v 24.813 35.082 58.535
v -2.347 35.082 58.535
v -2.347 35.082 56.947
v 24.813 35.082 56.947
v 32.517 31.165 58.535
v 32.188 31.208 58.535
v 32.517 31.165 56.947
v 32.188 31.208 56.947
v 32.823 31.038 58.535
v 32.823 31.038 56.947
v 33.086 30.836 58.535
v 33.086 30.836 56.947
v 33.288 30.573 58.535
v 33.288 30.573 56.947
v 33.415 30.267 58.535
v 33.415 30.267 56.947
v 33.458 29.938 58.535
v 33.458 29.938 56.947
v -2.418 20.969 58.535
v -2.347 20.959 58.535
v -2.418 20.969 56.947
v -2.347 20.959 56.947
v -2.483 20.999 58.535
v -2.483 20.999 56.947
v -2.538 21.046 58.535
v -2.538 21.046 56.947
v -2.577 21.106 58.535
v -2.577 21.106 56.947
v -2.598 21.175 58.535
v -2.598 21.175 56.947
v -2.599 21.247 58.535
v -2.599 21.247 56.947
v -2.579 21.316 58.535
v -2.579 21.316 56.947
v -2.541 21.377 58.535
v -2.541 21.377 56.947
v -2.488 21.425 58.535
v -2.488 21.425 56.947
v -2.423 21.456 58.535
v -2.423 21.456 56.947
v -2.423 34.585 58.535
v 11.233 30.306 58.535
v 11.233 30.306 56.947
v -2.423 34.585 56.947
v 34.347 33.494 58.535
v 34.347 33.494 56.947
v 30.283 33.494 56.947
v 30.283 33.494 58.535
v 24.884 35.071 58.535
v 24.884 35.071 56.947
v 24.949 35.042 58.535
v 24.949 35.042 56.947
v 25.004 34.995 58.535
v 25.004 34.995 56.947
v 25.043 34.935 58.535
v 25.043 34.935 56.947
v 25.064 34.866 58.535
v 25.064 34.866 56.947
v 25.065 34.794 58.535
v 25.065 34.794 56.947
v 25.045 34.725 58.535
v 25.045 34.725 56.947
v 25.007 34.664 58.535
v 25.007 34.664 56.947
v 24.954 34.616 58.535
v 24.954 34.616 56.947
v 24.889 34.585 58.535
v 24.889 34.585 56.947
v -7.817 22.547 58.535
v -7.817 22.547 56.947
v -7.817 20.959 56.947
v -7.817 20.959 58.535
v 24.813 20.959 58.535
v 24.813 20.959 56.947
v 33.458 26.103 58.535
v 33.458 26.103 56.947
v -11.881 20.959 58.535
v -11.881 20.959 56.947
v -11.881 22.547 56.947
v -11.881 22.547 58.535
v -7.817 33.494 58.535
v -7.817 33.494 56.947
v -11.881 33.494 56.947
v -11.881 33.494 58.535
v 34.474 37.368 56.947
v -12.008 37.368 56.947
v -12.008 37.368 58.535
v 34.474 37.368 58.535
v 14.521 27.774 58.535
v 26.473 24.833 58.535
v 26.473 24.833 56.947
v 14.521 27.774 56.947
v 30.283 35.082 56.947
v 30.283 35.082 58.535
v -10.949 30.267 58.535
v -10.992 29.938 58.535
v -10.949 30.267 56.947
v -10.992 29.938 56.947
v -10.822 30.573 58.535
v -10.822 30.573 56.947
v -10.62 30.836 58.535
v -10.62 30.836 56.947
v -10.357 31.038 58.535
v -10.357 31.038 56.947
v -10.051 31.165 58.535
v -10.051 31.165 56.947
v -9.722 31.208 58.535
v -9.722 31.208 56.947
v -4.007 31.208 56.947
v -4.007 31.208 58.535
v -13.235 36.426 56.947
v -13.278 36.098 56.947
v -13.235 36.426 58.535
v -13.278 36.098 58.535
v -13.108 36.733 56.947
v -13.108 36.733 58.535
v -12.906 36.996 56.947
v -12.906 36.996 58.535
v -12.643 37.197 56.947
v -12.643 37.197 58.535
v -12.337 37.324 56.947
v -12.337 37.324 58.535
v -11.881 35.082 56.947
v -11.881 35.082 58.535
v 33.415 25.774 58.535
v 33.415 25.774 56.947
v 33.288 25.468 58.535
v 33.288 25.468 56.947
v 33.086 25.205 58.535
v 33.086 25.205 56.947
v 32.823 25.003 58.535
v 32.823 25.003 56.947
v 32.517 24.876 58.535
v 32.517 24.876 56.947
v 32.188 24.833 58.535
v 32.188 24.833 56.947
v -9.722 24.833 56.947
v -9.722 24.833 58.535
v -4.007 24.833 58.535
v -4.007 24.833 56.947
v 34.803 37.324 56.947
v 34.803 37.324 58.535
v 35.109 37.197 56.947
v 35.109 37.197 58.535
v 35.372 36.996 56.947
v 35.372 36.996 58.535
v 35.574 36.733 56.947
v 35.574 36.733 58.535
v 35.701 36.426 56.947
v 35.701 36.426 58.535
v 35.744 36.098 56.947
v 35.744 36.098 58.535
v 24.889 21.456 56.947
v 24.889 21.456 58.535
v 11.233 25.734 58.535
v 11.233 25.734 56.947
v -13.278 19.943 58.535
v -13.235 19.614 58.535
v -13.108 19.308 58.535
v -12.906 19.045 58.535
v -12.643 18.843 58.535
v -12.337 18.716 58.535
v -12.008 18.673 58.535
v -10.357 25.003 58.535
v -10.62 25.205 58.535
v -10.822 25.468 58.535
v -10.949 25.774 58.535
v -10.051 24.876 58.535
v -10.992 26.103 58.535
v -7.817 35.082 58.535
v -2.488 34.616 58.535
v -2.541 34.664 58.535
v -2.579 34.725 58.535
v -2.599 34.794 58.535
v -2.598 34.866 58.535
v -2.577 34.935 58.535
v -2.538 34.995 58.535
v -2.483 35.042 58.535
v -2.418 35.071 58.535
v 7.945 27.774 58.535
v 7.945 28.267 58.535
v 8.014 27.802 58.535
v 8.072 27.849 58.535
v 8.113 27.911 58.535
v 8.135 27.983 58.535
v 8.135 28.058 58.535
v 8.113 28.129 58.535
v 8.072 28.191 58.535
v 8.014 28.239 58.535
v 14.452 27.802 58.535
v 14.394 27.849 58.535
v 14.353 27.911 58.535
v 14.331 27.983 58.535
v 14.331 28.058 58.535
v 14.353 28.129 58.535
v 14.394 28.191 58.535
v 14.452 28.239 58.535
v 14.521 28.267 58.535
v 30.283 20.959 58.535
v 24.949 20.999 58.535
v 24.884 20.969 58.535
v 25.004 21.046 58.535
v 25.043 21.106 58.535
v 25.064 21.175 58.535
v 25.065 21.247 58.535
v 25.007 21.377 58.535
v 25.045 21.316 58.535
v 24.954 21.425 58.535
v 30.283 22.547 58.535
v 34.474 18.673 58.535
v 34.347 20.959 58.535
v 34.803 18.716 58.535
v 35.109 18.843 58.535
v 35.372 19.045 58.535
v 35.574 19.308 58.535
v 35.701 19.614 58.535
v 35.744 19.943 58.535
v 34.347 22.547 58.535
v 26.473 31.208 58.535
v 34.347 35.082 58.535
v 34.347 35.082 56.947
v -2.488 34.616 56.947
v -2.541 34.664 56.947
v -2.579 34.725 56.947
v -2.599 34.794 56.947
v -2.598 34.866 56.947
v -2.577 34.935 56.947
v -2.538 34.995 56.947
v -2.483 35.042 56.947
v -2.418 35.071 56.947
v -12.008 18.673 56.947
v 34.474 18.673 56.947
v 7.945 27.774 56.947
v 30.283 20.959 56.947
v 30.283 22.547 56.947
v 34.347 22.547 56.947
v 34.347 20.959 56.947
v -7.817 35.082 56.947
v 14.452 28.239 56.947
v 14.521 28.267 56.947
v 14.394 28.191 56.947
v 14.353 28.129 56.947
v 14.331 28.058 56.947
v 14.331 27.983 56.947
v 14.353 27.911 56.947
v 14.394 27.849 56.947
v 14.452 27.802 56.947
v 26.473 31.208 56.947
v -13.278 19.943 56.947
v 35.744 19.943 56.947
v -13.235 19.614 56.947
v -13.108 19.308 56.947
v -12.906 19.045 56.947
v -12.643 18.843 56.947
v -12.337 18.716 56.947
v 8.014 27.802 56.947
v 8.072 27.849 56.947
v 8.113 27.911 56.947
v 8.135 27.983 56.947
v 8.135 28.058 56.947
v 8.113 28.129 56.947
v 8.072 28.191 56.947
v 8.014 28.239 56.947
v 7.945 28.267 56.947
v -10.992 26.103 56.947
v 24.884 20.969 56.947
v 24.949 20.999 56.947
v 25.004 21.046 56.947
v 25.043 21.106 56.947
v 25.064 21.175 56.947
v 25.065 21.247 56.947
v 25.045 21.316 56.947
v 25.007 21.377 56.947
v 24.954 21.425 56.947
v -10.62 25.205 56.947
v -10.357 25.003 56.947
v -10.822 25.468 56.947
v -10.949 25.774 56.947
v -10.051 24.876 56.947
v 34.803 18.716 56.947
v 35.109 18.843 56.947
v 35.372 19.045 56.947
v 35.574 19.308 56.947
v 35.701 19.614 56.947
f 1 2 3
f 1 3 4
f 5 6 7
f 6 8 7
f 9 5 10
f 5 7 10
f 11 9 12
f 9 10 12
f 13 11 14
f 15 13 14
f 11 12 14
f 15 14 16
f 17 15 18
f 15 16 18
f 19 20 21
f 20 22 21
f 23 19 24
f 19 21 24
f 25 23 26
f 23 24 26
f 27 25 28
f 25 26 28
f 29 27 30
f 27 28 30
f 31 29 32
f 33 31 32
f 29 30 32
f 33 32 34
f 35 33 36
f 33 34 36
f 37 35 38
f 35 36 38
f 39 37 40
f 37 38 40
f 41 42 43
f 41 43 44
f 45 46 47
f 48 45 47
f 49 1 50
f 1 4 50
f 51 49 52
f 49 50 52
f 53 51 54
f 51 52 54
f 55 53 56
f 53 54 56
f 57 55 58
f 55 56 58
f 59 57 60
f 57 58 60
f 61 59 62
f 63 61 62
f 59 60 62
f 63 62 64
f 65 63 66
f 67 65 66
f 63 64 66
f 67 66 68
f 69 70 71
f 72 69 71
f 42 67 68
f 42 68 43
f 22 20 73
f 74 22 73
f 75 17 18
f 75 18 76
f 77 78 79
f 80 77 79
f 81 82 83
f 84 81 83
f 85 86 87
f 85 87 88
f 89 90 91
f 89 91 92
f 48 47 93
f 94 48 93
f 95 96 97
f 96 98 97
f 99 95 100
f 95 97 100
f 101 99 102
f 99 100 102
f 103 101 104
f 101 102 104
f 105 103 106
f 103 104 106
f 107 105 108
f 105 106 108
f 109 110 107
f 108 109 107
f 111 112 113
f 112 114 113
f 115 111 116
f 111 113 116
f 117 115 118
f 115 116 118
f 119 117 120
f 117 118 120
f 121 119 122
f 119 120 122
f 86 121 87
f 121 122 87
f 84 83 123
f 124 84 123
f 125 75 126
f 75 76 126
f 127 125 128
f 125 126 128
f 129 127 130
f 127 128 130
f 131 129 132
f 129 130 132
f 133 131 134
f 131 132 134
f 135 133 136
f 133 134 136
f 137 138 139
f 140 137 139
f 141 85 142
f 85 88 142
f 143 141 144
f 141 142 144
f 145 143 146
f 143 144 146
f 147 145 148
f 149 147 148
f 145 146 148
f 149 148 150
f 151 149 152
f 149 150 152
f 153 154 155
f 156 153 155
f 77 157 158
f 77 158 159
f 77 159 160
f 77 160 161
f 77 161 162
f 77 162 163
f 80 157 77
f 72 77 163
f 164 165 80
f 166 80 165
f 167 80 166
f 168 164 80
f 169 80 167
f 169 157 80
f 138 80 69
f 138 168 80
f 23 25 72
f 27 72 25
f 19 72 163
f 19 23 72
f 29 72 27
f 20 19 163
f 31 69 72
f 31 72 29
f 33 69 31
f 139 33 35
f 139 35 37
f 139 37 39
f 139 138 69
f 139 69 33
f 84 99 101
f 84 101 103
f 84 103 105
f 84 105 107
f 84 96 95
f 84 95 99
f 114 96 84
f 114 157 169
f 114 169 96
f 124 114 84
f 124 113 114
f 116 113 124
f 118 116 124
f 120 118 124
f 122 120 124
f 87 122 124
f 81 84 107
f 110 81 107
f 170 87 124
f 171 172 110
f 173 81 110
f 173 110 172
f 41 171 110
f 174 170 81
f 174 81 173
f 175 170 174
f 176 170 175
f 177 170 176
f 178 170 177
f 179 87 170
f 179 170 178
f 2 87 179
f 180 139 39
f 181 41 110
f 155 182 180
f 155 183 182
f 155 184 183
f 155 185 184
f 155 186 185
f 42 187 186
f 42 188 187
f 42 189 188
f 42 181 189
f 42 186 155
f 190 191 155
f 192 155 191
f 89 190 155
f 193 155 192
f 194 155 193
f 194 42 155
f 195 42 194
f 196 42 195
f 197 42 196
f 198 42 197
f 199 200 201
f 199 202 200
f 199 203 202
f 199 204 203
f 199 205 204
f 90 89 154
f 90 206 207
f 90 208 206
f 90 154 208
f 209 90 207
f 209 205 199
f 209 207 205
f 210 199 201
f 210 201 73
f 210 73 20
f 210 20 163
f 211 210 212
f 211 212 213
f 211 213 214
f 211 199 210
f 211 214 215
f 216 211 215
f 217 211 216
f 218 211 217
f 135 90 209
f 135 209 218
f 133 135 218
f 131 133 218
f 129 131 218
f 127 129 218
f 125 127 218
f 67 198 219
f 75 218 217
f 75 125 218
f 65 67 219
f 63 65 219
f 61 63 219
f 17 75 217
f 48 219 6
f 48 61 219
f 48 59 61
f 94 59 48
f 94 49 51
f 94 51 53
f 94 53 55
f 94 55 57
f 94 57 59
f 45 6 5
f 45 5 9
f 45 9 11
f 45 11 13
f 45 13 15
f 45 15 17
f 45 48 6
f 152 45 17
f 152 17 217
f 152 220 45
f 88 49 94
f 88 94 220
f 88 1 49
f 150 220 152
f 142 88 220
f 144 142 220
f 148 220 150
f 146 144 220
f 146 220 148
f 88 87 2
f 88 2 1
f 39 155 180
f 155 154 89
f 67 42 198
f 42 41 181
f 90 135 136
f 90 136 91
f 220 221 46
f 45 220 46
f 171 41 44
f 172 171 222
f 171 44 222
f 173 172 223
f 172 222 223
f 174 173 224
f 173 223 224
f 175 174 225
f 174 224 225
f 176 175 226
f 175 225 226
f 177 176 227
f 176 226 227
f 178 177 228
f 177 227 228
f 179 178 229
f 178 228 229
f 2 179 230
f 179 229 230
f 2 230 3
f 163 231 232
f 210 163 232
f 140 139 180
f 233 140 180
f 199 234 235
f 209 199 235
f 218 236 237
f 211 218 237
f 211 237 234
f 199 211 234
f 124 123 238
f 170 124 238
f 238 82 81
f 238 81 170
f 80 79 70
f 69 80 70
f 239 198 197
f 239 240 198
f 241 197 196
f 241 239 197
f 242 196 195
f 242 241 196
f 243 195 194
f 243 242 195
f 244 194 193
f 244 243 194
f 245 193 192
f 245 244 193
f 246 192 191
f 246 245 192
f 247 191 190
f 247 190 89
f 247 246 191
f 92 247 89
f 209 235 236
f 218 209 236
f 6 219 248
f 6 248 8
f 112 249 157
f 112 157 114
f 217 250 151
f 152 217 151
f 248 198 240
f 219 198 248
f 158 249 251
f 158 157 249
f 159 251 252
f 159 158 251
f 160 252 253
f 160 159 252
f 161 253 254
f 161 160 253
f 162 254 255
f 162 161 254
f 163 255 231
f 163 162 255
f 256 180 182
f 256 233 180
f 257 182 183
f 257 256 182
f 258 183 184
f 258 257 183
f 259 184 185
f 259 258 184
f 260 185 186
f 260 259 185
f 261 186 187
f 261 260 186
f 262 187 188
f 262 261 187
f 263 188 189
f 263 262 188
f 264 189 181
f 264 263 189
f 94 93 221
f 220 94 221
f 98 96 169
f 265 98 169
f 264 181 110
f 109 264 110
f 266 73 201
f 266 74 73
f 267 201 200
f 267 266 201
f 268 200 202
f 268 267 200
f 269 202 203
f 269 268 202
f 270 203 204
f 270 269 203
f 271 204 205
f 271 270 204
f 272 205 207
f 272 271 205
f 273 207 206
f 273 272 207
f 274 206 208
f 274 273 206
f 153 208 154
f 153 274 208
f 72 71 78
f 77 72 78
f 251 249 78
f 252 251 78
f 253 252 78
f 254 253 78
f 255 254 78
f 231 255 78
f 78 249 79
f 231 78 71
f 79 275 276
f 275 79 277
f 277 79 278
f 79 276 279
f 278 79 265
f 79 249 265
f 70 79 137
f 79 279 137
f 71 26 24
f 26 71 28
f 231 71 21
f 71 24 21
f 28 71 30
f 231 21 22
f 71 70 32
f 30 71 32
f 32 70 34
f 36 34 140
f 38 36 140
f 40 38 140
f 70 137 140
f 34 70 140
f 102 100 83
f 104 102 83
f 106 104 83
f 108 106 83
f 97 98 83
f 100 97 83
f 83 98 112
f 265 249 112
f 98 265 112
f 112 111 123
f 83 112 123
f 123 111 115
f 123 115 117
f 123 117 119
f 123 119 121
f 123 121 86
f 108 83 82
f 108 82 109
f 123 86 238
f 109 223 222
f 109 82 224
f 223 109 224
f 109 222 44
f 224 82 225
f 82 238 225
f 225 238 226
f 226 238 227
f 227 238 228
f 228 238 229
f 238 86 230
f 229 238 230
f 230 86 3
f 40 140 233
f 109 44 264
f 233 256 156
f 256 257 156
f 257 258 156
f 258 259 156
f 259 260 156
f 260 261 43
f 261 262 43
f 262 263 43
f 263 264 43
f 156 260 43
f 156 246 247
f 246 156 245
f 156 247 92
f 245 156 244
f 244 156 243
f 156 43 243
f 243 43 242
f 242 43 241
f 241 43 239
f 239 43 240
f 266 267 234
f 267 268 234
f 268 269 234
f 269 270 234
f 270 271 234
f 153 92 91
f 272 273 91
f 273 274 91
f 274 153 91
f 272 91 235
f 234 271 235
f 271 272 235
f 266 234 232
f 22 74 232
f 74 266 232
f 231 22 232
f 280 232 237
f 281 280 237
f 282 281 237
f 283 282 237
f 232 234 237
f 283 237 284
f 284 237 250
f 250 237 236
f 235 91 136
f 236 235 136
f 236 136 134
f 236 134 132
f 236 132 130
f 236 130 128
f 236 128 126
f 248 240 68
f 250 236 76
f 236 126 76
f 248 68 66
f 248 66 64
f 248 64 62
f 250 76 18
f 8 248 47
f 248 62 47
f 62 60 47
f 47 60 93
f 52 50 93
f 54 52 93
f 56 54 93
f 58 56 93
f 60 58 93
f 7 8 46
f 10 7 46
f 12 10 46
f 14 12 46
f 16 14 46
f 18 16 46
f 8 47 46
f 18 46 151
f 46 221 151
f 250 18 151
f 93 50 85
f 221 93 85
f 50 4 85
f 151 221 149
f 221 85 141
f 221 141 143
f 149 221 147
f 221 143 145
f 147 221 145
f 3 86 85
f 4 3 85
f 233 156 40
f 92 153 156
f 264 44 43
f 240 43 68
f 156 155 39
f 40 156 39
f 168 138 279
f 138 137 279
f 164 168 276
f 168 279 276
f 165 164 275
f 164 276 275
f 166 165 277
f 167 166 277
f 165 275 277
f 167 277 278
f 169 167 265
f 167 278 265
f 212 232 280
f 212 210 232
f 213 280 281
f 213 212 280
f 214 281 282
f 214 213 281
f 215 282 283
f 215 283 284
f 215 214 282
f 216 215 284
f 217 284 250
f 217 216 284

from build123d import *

# Parameters (mm, degrees)
SKETCH1_W           = 49.022
SKETCH1_H           = 18.6944
SKETCH1_W_2         = 38.1
SKETCH1_H_2         = 1.5875
BOSS_EXTRUDE1_DEPTH = 1.5875
CUT_EXTRUDE1_REACH  = 53.735
FILLET1_R           = 0.254
FILLET2_R           = 1.27


with BuildPart() as part:
    # Sketch1 → Boss-Extrude1 (new body)
    # profile 1 of 2: a face of its own
    with BuildSketch(Plane.XY.offset(56.947143149)):
        with Locations((11.232994638, 28.020399012)):
            Rectangle(SKETCH1_W, SKETCH1_H)
        Polygon((-11.881005362, 20.959199012), (-11.881005362, 22.546699012), (-10.992005362, 22.546699012), (-8.706005362, 22.546699012), (-7.817005362, 22.546699012), (-7.817005362, 20.959199012), (-8.706005362, 20.959199012), (-10.992005362, 20.959199012), align=None, mode=Mode.SUBTRACT)
        Polygon((33.457994638, 22.546699012), (34.346994638, 22.546699012), (34.346994638, 20.959199012), (33.457994638, 20.959199012), (31.171994638, 20.959199012), (30.282994638, 20.959199012), (30.282994638, 22.546699012), (31.171994638, 22.546699012), align=None, mode=Mode.SUBTRACT)
        Polygon((31.171994638, 33.494099012), (30.282994638, 33.494099012), (-7.817005362, 33.494099012), (-8.706005362, 33.494099012), (-10.992005362, 33.494099012), (-11.881005362, 33.494099012), (-11.881005362, 35.081599012), (-10.992005362, 35.081599012), (-8.706005362, 35.081599012), (-7.817005362, 35.081599012), (30.282994638, 35.081599012), (31.171994638, 35.081599012), (33.457994638, 35.081599012), (34.346994638, 35.081599012), (34.346994638, 33.494099012), (33.457994638, 33.494099012), align=None, mode=Mode.SUBTRACT)
    # profile 2 of 2: a face of its own
    with BuildSketch(Plane.XY.offset(56.947143149)):
        with Locations((11.232994638, 34.287849012)):
            Rectangle(SKETCH1_W_2, SKETCH1_H_2)
    extrude(amount=BOSS_EXTRUDE1_DEPTH)

    # Sketch3 → Cut-Extrude1 (cut, up to next)
    with BuildSketch(Plane.XY.offset(58.534643149), mode=Mode.PRIVATE) as cut_extrude1_sk1:
        Polygon((11.232994638, 25.734399012), (-4.006890486, 20.959199012), (26.472879762, 20.959199012), align=None)
    cut_extrude1_tool1 = extrude(cut_extrude1_sk1.sketch, amount=-CUT_EXTRUDE1_REACH, mode=Mode.PRIVATE) & part.part
    # Sketch3 → Cut-Extrude1 (cut, up to next)
    with BuildSketch(Plane.XY.offset(58.534643149), mode=Mode.PRIVATE) as cut_extrude1_sk2:
        Polygon((13.518994638, 28.020399012), (26.472879762, 31.208099012), (33.457994638, 31.208099012), (33.457994638, 24.832699012), (26.472879762, 24.832699012), align=None)
    cut_extrude1_tool2 = extrude(cut_extrude1_sk2.sketch, amount=-CUT_EXTRUDE1_REACH, mode=Mode.PRIVATE) & part.part
    # Sketch3 → Cut-Extrude1 (cut, up to next)
    with BuildSketch(Plane.XY.offset(58.534643149), mode=Mode.PRIVATE) as cut_extrude1_sk3:
        Polygon((11.232994638, 30.306399012), (-4.006890486, 35.081599012), (26.472879762, 35.081599012), align=None)
    cut_extrude1_tool3 = extrude(cut_extrude1_sk3.sketch, amount=-CUT_EXTRUDE1_REACH, mode=Mode.PRIVATE) & part.part
    # Sketch3 → Cut-Extrude1 (cut, up to next)
    with BuildSketch(Plane.XY.offset(58.534643149), mode=Mode.PRIVATE) as cut_extrude1_sk4:
        Polygon((-4.006890486, 31.208099012), (-10.992005362, 31.208099012), (-10.992005362, 24.832699012), (-4.006890486, 24.832699012), (8.946994638, 28.020399012), align=None)
    cut_extrude1_tool4 = extrude(cut_extrude1_sk4.sketch, amount=-CUT_EXTRUDE1_REACH, mode=Mode.PRIVATE) & part.part
    add(cut_extrude1_tool1.solids().sort_by_distance((11.232995, 22.550932, 58.534643))[0], mode=Mode.SUBTRACT)
    add(cut_extrude1_tool2.solids().sort_by_distance((26.207595, 28.020399, 58.534643))[0], mode=Mode.SUBTRACT)
    add(cut_extrude1_tool3.solids().sort_by_distance((11.232995, 33.489866, 58.534643))[0], mode=Mode.SUBTRACT)
    add(cut_extrude1_tool4.solids().sort_by_distance((-3.741606, 28.020399, 58.534643))[0], mode=Mode.SUBTRACT)

    # Fillet1
    fillet1_edges = [part.edges().sort_by_distance(p)[0] for p in [
        (-4.006890486, 35.081599012, 57.740893149),
        (26.472879762, 35.081599012, 57.740893149),
        (8.946994638, 28.020399012, 57.740893149),
        (-4.006890486, 20.959199012, 57.740893149),
        (26.472879762, 20.959199012, 57.740893149),
        (13.518994638, 28.020399012, 57.740893149),
    ]]
    fillet(fillet1_edges, radius=FILLET1_R)

    # Fillet2
    fillet2_edges = [part.edges().sort_by_distance(p)[0] for p in [
        (-10.992005362, 31.208099012, 57.740893149),
        (-10.992005362, 24.832699012, 57.740893149),
        (-13.278005362, 37.367599012, 57.740893149),
        (35.743994638, 37.367599012, 57.740893149),
        (35.743994638, 18.673199012, 57.740893149),
        (-13.278005362, 18.673199012, 57.740893149),
        (33.457994638, 31.208099012, 57.740893149),
        (33.457994638, 24.832699012, 57.740893149),
    ]]
    fillet(fillet2_edges, radius=FILLET2_R)


solid = part.part
